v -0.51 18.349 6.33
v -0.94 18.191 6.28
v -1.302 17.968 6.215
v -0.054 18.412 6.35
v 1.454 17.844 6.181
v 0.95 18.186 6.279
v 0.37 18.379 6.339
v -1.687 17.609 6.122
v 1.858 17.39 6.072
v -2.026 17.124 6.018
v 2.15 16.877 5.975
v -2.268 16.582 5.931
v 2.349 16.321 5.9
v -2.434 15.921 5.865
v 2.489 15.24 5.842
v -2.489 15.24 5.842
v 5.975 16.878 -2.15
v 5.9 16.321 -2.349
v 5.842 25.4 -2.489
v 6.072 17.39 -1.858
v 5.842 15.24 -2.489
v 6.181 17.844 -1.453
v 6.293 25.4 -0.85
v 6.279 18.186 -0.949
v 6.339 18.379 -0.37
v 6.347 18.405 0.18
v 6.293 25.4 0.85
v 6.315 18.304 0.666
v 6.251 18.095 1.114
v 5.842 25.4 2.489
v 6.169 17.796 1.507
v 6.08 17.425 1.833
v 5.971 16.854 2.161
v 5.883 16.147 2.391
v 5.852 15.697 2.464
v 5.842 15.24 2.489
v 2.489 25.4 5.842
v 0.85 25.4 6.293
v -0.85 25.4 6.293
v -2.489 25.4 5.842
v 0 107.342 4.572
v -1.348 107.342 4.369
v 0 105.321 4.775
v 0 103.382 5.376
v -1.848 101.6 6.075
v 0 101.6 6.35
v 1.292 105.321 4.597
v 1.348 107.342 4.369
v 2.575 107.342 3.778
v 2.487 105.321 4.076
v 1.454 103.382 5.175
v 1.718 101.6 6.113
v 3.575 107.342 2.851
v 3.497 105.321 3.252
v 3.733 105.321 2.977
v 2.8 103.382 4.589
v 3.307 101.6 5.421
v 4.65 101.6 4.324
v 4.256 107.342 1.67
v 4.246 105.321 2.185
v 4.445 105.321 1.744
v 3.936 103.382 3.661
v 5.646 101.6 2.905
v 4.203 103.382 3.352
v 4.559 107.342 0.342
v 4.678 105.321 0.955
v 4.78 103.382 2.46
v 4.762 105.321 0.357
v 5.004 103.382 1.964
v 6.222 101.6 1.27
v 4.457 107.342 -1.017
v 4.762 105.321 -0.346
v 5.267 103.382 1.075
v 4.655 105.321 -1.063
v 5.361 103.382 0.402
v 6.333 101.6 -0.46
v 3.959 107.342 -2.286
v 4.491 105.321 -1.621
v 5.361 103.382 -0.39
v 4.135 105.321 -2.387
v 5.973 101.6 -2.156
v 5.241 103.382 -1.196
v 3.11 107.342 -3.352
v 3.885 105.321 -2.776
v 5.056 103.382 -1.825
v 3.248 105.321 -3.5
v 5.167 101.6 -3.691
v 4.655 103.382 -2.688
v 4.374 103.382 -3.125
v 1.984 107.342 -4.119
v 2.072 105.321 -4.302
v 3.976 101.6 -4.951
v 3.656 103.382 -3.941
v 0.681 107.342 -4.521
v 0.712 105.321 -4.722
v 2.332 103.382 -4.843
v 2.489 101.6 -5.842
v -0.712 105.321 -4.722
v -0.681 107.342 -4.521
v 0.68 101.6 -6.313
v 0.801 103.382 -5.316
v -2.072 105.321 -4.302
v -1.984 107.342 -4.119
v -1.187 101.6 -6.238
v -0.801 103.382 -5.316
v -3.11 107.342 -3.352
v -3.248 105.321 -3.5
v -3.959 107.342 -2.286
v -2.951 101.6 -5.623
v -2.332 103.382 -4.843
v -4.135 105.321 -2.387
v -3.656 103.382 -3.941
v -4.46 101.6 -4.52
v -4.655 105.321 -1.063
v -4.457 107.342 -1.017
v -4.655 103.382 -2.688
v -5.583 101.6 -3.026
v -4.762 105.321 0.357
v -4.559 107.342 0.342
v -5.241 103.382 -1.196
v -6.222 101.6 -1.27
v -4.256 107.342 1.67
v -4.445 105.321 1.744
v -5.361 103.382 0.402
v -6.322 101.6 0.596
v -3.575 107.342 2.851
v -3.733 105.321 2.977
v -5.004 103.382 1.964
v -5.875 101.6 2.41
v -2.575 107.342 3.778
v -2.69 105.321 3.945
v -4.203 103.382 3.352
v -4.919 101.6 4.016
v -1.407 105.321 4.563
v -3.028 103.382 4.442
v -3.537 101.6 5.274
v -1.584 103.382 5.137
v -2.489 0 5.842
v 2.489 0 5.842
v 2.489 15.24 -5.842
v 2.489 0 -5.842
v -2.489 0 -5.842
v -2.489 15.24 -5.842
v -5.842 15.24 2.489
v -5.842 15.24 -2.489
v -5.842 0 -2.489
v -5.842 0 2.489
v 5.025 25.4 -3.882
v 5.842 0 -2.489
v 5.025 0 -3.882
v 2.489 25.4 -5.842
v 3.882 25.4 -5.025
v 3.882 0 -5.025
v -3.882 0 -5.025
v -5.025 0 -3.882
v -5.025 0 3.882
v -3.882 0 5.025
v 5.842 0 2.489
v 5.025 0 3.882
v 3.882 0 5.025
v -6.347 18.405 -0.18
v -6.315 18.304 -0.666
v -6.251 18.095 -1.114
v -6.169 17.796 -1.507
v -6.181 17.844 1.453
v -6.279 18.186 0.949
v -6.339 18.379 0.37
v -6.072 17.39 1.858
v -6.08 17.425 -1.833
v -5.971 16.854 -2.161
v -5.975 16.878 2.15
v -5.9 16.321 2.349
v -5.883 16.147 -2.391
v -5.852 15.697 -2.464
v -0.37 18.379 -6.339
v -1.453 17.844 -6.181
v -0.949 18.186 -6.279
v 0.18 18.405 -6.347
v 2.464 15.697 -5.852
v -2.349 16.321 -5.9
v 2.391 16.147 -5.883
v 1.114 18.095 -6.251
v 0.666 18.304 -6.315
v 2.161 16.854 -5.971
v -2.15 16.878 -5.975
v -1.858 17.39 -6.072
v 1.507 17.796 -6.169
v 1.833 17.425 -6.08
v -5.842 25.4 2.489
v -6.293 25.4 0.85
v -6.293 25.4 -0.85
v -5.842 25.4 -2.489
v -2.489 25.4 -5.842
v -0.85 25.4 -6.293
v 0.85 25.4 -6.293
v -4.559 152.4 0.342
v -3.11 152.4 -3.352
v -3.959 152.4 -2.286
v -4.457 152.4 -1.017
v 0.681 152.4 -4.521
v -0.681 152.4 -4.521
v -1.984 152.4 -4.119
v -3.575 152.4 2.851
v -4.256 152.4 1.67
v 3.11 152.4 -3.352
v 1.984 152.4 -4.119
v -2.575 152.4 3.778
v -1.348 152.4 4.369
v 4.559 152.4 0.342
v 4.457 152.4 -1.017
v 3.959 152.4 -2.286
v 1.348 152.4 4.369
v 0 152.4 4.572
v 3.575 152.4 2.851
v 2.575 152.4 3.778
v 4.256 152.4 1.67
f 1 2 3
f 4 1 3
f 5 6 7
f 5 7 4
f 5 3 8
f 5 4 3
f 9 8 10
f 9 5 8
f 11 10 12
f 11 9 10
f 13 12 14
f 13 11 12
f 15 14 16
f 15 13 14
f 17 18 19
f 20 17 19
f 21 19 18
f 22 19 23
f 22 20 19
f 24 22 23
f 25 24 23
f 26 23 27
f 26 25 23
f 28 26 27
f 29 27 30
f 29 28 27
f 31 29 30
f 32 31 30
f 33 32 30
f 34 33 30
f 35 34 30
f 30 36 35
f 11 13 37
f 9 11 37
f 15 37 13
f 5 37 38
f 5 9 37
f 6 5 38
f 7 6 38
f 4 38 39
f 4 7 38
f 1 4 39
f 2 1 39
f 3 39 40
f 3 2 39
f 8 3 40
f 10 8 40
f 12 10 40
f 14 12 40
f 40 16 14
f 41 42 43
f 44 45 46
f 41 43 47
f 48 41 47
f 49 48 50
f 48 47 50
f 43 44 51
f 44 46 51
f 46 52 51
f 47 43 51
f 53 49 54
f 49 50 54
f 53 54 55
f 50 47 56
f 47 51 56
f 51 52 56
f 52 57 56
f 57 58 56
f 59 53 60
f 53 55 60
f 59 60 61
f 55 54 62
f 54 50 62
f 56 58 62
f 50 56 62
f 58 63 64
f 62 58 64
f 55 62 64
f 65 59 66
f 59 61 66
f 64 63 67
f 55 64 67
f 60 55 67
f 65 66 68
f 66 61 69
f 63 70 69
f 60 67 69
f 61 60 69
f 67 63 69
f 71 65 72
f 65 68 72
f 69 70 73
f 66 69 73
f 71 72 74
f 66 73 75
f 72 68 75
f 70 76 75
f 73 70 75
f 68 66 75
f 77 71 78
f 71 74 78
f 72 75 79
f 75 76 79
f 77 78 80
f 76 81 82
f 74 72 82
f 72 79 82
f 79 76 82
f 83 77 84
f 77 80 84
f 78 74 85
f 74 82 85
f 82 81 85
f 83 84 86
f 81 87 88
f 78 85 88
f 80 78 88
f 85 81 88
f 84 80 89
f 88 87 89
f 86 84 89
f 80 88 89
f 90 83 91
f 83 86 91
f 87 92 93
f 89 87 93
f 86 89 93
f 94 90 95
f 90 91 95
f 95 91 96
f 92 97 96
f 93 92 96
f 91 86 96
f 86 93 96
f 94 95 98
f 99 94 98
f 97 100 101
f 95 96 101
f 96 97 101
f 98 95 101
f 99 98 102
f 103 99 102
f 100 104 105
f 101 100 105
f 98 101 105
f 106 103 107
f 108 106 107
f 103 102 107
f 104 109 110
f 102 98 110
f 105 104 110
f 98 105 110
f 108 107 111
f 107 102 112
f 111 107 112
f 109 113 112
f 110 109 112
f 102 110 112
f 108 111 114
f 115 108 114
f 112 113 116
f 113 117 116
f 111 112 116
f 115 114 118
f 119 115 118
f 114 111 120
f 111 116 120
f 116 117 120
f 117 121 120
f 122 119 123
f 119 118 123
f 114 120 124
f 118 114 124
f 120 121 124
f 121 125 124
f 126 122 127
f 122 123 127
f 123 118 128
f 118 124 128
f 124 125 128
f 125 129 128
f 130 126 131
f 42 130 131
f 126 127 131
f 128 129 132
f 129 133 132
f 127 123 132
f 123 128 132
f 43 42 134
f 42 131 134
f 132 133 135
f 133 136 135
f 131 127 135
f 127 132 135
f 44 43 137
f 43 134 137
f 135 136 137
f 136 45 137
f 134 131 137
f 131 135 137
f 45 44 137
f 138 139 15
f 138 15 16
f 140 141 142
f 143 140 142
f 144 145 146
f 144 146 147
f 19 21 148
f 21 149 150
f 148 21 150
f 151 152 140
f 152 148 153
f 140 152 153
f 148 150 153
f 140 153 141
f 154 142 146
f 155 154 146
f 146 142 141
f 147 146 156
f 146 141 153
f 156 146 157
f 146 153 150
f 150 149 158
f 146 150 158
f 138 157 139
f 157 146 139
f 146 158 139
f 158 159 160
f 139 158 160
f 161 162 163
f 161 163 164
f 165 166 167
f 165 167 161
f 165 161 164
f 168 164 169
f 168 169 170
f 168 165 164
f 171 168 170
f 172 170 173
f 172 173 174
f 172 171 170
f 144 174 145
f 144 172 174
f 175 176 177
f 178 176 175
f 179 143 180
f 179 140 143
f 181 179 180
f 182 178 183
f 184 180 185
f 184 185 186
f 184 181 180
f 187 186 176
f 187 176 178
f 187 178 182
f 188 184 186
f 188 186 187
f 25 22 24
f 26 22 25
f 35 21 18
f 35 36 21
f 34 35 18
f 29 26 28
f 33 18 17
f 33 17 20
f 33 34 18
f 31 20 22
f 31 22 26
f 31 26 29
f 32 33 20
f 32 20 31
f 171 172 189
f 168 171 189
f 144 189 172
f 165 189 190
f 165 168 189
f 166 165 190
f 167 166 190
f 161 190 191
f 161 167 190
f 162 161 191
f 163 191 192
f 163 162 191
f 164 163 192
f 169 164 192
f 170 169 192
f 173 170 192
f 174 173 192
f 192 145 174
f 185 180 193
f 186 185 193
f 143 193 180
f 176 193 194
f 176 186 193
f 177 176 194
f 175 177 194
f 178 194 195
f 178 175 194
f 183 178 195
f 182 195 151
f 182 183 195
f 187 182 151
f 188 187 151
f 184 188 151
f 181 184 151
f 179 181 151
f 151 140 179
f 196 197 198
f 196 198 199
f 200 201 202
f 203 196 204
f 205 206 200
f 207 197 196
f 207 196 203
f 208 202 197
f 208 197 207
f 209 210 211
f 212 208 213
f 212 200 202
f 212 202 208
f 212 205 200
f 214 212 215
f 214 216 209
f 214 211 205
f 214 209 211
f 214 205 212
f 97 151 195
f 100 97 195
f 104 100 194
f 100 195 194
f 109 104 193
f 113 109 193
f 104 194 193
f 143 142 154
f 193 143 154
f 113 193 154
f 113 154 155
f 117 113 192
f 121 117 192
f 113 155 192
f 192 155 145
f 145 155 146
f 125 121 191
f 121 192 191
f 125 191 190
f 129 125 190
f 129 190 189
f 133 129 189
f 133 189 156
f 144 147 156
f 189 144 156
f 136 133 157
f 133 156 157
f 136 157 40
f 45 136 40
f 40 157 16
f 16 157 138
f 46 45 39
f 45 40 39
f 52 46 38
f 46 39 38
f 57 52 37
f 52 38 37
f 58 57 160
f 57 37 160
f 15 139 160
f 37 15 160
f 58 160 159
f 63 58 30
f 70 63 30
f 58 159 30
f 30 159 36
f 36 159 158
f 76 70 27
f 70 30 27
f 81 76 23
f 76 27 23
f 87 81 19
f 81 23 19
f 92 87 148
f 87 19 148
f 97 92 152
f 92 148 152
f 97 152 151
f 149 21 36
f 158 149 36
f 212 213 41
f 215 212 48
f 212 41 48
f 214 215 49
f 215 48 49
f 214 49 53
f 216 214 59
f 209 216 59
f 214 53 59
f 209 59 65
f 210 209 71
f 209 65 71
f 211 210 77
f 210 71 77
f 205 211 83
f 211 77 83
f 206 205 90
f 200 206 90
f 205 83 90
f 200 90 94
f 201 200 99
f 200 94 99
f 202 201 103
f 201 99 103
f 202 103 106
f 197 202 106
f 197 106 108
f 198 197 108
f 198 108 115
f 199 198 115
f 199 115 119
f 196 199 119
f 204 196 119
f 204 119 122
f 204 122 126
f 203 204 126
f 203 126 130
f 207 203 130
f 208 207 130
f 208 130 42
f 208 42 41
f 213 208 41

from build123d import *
from build123d.topology import SkipClean

# Parameters (mm, degrees)
SKETCH1_R           = 6.35
BOSS_EXTRUDE1_DEPTH = 25.4
SKETCH3_W           = 3.762901665
SKETCH3_H           = 11.173304621
SKETCH3_W_2         = 4.189249379
CUT_EXTRUDE2_DEPTH  = 25.4
CUT_EXTRUDE3_DEPTH  = 25.4
SKETCH5_R           = 6.35
BOSS_EXTRUDE2_DEPTH = 76.2
FILLET2_R           = 10.16
FILLET3_R           = 10.16
SKETCH6_R           = 4.572
BOSS_EXTRUDE3_DEPTH = 50.8
FILLET5_R           = 10.16


with BuildPart() as part:
    # Sketch1 → Boss-Extrude1 (new body)
    with BuildSketch(Plane(origin=(0, 0, 0), x_dir=(1, 0, 0), z_dir=(0, 1, 0))):
        with Locations(Location((0, 0, 0), (0, 0, 270))):
            Circle(SKETCH1_R)
    extrude(amount=BOSS_EXTRUDE1_DEPTH)

    # Sketch3 → Cut-Extrude2 (cut)
    with BuildSketch(Plane.XZ):
        with Locations((7.723450833, -0.009887881)):
            Rectangle(SKETCH3_W, SKETCH3_H)
        with Locations((-7.93662469, -0.009887881)):
            Rectangle(SKETCH3_W_2, SKETCH3_H)
    extrude(amount=-CUT_EXTRUDE2_DEPTH, mode=Mode.SUBTRACT)

    # Sketch4 → Cut-Extrude3 (cut)
    with BuildSketch(Plane.XZ):
        Polygon((5.523986446, -5.842), (-7.059783038, -5.842), (-7.059783038, -10.872351768), (5.523986446, -11.066959799), align=None)
    cut_extrude3 = extrude(amount=-CUT_EXTRUDE3_DEPTH, mode=Mode.SUBTRACT)

    # Sketch5 → Boss-Extrude2 (add)
    with BuildSketch(Plane(origin=(0, 25.4, 0), x_dir=(1, 0, 0), z_dir=(0, 1, 0))):
        with Locations(Location((0, 0, 0), (0, 0, 66.926081934))):
            Circle(SKETCH5_R)
    extrude(amount=BOSS_EXTRUDE2_DEPTH)

    # Fillet2
    # the kernel refuses this fillet: 10.16 mm, written as the material it adds along each edge
    with BuildSketch(Plane(origin=(-5.842, 25.4, 27.888681579), x_dir=(0, -1, 0), z_dir=(0, 0, -1))) as fillet2_piece_1_section:
        with BuildLine():
            CenterArc((FILLET2_R, FILLET2_R), FILLET2_R, 180, 90)
            Line((0, FILLET2_R), (0, 0))
            Line((0, 0), (FILLET2_R, 0))
        make_face()
    fillet2_piece_1 = extrude(amount=55.777363157, mode=Mode.PRIVATE)
    fillet2_piece_1 = fillet2_piece_1 & Plane(origin=(0, 21.230044771, 0), x_dir=(0, 0, 1), z_dir=(0, -1, 0)) * Cylinder(6.35, 153, mode=Mode.PRIVATE)
    add(fillet2_piece_1)
    with BuildSketch(Plane(origin=(5.842, 25.4, 27.888681579), x_dir=(0, -1, 0), z_dir=(0, 0, -1))) as fillet2_piece_2_section:
        with BuildLine():
            CenterArc((FILLET2_R, -FILLET2_R), FILLET2_R, 90, 90)
            Line((0, -FILLET2_R), (0, 0))
            Line((0, 0), (FILLET2_R, 0))
        make_face()
    fillet2_piece_2 = extrude(amount=55.777363157, mode=Mode.PRIVATE)
    fillet2_piece_2 = fillet2_piece_2 & Plane(origin=(0, 21.230044771, 0), x_dir=(0, 0, 1), z_dir=(0, -1, 0)) * Cylinder(6.35, 153, mode=Mode.PRIVATE)
    add(fillet2_piece_2)

    # Mirror1: Cut-Extrude3 across plane
    with SkipClean():  # the faces are left unmerged after this step: merging them gives an invalid solid
        add(cut_extrude3.mirror(Plane.XY), mode=Mode.SUBTRACT)
    add(part.part.scale(1), mode=Mode.REPLACE)  # the faces are merged on a copy

    # Fillet3
    # the kernel refuses this fillet: 10.16 mm, written as the material it adds along each edge
    with BuildSketch(Plane(origin=(27.888681579, 25.4, 5.842), x_dir=(0, -1, 0), z_dir=(-1, 0, 0))) as fillet3_piece_1_section:
        with BuildLine():
            CenterArc((FILLET3_R, FILLET3_R), FILLET3_R, 180, 90)
            Line((0, FILLET3_R), (0, 0))
            Line((0, 0), (FILLET3_R, 0))
        make_face()
    fillet3_piece_1 = extrude(amount=55.777363157, mode=Mode.PRIVATE)
    fillet3_piece_1 = fillet3_piece_1 & Plane(origin=(0, 21.230043926, 0), x_dir=(0, 0, 1), z_dir=(0, -1, 0)) * Cylinder(6.35, 153, mode=Mode.PRIVATE)
    add(fillet3_piece_1)
    with BuildSketch(Plane(origin=(27.888681579, 25.4, -5.842), x_dir=(0, 0, -1), z_dir=(-1, 0, 0))) as fillet3_piece_2_section:
        with BuildLine():
            CenterArc((FILLET3_R, FILLET3_R), FILLET3_R, 180, 90)
            Line((0, FILLET3_R), (0, 0))
            Line((0, 0), (FILLET3_R, 0))
        make_face()
    fillet3_piece_2 = extrude(amount=55.777363157, mode=Mode.PRIVATE)
    fillet3_piece_2 = fillet3_piece_2 & Plane(origin=(0, 21.230042518, 0), x_dir=(0, 0, 1), z_dir=(0, -1, 0)) * Cylinder(6.35, 153, mode=Mode.PRIVATE)
    add(fillet3_piece_2)

    # Sketch6 → Boss-Extrude3 (add)
    with BuildSketch(Plane(origin=(0, 101.6, 0), x_dir=(1, 0, 0), z_dir=(0, 1, 0))):
        with Locations(Location((0, 0, 0), (0, 0, 270))):
            Circle(SKETCH6_R)
    extrude(amount=BOSS_EXTRUDE3_DEPTH)

    # Fillet5
    # the kernel refuses this fillet: 10.16 mm, written as the material it adds along each edge
    with BuildSketch(Plane(origin=(0, 101.6, 0), x_dir=(0, 0, 1), z_dir=(-1, 0, 0))) as fillet5_piece_1:
        with BuildLine():
            CenterArc((14.732, 5.741748514), FILLET5_R, 180, 34.41150867)
            Line((4.572, 5.741748514), (4.3688, 5.741748514))
            Line((4.3688, 5.741748514), (4.3688, 0))
            Line((4.3688, 0), (4.572, -0.2032))
            ThreePointArc((4.572, -0.2032), (5.461, -0.2032), (6.18236, -0.11483497))
            Line((6.18236, -0.11483497), (6.35, 0))
        make_face()
    revolve(axis=Axis((0, 101.6, 0), (0, 1, 0)))


solid = part.part
